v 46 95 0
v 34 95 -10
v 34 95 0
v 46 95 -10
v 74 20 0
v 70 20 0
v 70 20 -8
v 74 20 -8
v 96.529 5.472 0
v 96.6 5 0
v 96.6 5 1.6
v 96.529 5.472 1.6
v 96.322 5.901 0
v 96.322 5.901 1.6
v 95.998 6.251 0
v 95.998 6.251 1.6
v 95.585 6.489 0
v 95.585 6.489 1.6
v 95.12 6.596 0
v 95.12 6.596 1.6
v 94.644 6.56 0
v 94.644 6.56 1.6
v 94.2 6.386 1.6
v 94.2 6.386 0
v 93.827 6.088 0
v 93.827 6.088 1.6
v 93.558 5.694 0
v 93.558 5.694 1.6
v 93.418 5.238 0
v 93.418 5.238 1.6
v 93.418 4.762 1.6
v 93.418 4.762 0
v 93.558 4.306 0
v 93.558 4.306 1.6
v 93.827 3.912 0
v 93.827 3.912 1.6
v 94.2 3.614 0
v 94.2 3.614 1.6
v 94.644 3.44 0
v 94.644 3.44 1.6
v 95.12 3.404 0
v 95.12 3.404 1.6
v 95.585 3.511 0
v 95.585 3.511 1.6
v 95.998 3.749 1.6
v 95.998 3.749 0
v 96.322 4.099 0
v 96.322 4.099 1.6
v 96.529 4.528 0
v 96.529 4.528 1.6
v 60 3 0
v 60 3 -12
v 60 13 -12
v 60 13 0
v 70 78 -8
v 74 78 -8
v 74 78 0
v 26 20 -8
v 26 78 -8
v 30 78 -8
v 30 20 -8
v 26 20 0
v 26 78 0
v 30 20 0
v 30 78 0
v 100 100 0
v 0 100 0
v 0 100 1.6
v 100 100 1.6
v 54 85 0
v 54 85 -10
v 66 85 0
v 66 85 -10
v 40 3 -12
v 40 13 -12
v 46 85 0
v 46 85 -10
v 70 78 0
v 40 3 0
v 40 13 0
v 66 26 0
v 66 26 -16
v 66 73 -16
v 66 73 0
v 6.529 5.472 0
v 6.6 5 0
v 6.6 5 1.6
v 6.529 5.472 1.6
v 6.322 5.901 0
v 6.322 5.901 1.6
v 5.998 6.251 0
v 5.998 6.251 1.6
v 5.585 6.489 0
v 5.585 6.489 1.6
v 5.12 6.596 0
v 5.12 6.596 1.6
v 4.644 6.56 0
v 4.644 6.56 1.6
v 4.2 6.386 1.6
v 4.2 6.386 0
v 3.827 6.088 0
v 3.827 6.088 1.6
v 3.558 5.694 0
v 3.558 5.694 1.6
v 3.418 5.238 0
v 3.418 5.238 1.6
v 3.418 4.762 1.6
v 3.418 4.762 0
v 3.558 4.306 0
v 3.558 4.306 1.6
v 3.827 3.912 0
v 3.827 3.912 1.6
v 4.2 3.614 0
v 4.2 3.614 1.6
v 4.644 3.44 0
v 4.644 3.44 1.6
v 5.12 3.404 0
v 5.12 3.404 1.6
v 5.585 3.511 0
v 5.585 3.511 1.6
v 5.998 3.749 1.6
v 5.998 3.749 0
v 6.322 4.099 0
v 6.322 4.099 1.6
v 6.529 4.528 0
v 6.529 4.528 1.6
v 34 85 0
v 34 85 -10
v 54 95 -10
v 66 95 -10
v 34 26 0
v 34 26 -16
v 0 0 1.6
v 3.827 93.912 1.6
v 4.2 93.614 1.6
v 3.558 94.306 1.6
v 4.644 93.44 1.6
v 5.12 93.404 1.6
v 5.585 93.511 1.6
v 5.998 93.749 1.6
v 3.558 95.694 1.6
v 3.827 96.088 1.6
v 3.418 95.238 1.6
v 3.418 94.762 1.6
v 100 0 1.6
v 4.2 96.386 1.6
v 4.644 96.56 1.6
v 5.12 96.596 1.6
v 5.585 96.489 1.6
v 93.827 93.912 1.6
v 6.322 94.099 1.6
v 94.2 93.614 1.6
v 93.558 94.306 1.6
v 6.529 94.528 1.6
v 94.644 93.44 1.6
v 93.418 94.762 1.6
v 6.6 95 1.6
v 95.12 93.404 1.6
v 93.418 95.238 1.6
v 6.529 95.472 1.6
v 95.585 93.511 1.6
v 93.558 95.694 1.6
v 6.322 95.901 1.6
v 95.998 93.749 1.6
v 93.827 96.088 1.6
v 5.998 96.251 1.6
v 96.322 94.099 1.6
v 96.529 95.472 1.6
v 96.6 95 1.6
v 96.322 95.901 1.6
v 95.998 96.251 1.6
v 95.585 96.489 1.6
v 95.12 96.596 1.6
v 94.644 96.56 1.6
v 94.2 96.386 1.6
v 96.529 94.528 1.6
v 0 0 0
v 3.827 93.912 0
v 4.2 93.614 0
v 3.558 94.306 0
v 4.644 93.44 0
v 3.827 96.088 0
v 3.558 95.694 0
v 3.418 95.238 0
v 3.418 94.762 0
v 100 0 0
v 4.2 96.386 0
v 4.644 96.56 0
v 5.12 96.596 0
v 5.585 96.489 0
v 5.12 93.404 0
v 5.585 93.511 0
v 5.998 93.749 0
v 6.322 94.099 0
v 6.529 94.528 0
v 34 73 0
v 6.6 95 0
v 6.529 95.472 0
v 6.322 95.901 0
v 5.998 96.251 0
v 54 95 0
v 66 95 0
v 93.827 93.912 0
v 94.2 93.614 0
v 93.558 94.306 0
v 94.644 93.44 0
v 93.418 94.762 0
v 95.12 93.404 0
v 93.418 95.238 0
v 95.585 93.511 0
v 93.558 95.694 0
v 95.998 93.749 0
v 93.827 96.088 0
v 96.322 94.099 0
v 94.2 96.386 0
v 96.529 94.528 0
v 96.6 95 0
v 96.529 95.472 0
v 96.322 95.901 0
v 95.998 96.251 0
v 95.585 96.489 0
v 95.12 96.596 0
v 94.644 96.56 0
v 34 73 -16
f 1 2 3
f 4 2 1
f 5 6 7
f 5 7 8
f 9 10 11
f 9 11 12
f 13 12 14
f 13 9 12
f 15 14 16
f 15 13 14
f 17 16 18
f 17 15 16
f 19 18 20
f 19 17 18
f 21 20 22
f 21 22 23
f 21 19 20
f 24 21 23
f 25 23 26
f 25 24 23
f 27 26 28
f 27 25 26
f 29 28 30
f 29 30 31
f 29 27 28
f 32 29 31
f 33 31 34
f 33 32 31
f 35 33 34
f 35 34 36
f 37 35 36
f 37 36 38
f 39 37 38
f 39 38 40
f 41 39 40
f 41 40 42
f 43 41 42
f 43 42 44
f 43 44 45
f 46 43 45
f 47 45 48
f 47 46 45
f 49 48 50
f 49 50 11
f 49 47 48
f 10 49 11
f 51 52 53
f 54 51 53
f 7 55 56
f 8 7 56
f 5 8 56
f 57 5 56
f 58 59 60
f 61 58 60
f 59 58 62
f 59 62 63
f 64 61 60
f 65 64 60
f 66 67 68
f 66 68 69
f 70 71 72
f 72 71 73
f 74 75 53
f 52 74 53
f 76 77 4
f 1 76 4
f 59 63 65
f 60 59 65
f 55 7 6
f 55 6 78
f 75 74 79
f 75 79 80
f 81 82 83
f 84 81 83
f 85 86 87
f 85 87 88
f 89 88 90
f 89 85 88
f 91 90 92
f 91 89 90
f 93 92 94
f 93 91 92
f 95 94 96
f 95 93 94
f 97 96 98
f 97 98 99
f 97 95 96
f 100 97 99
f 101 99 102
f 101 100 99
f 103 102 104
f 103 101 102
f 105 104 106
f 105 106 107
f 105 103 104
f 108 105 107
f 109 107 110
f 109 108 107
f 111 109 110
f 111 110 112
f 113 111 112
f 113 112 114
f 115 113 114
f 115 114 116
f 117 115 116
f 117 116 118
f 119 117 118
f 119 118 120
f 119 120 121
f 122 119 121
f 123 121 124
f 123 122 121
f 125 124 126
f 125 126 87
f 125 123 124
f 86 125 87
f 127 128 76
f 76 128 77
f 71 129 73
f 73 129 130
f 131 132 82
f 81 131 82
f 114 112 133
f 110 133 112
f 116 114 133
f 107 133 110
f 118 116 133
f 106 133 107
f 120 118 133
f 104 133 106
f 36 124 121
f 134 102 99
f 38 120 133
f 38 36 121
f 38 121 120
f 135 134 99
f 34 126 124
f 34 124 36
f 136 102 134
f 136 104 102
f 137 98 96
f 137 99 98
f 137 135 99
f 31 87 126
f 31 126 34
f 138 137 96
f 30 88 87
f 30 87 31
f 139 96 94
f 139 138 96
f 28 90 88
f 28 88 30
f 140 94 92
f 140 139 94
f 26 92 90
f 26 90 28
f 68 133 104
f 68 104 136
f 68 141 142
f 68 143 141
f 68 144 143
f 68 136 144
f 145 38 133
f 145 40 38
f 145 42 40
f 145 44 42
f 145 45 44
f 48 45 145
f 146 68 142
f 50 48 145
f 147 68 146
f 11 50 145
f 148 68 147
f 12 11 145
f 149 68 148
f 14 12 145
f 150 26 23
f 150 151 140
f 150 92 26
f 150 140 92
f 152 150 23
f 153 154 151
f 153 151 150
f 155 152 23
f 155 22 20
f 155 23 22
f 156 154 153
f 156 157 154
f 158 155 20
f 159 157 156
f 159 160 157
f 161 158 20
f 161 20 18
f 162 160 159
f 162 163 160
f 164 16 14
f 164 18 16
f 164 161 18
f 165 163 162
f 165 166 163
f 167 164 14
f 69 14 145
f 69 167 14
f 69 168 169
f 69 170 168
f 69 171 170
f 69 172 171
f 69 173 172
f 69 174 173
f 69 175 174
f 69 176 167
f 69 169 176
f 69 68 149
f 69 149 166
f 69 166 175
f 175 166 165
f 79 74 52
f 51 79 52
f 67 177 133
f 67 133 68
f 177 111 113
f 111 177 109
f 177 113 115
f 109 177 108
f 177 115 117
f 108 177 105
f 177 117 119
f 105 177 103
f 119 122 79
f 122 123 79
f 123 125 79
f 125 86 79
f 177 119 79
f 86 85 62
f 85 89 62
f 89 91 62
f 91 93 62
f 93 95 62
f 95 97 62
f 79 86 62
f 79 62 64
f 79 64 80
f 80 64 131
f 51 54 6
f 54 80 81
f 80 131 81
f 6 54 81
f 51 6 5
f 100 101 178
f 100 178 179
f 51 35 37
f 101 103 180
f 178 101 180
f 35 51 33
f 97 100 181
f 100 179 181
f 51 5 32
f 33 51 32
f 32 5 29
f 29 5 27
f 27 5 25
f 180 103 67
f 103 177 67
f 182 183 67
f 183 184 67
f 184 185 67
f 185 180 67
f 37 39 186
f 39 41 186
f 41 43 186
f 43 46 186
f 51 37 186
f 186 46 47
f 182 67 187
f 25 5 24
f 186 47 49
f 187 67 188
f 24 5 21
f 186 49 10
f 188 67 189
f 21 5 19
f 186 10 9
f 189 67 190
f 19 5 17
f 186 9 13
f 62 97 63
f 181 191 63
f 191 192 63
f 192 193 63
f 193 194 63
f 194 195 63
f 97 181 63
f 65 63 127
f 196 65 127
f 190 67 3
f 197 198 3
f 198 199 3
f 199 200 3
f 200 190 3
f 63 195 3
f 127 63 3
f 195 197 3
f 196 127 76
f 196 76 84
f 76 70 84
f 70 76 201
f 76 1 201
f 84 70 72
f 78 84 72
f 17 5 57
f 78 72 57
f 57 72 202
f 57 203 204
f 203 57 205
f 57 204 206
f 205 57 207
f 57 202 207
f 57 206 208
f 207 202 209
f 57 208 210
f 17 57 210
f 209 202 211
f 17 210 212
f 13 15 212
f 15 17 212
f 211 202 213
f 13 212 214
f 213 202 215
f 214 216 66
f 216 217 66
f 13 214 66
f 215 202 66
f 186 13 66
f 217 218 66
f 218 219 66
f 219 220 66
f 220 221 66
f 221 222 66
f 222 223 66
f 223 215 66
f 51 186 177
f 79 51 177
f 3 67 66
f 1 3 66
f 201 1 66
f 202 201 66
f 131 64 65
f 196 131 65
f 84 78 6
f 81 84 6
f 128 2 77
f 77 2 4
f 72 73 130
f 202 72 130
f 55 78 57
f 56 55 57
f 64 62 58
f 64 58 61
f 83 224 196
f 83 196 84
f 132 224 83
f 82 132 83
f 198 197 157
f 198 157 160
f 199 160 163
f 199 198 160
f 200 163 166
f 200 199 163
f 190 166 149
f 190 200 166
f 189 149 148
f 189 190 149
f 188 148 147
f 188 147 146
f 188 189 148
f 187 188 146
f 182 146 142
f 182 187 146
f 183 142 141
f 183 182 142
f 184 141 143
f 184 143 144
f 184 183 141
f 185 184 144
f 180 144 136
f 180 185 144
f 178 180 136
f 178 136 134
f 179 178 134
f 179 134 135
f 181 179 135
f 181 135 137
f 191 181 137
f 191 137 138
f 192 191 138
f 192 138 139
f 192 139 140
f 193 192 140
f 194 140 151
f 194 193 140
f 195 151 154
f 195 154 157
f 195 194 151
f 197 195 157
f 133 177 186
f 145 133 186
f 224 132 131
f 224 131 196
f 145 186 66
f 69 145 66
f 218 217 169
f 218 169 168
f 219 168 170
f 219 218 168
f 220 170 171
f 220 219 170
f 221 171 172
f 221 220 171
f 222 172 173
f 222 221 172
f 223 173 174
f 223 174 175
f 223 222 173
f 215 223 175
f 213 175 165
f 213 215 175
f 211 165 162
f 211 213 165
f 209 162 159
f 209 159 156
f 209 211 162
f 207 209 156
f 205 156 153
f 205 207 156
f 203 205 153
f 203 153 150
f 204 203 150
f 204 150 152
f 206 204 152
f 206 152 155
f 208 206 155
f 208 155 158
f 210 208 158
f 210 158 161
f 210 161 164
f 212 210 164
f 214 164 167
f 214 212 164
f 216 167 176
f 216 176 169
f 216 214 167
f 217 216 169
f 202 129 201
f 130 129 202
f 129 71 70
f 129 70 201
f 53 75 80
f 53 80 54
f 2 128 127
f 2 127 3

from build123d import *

# Parameters (mm, degrees)
SKETCH_1_W          = 100
SKETCH_1_H          = 100
SKETCH_1_R          = 1.6
F_100X100_1P6_DEPTH = 1.6
EXTRUDE_START       = -8
SKETCH_2_W          = 4
SKETCH_2_H          = 58
EXTRUDE_284_DEPTH   = 8
SKETCH_3_W          = 4
SKETCH_3_H          = 58
EXTRUDE_361_DEPTH   = 8
EXTRUDE_START_2     = -16
SKETCH_4_W          = 32
SKETCH_4_H          = 47
EXTRUDE_435_DEPTH   = 16
EXTRUDE_START_3     = -12
SKETCH_5_W          = 20
SKETCH_5_H          = 10
EXTRUDE_509_DEPTH   = 12
EXTRUDE_START_4     = -10
SKETCH_6_W          = 12
SKETCH_6_H          = 10
EXTRUDE_583_DEPTH   = 10
SKETCH_7_W          = 12
SKETCH_7_H          = 10
EXTRUDE_657_DEPTH   = 10


with BuildPart() as part:
    # 草图1 → 100x100_板厚1p6 (new body)
    with BuildSketch(Plane.XY):
        with Locations((50, 50)):
            Rectangle(SKETCH_1_W, SKETCH_1_H)
        with Locations((5, 5)):
            Circle(SKETCH_1_R, mode=Mode.SUBTRACT)
        with Locations((95, 5)):
            Circle(SKETCH_1_R, mode=Mode.SUBTRACT)
        with Locations((5, 95)):
            Circle(SKETCH_1_R, mode=Mode.SUBTRACT)
        with Locations((95, 95)):
            Circle(SKETCH_1_R, mode=Mode.SUBTRACT)
    extrude(amount=F_100X100_1P6_DEPTH)

    # 草图2 → Extrude 284 (add)
    with BuildSketch(Plane.XY.offset(EXTRUDE_START)):
        with Locations((28, 49)):
            Rectangle(SKETCH_2_W, SKETCH_2_H)
    extrude(amount=EXTRUDE_284_DEPTH)

    # 草图3 → Extrude 361 (add)
    with BuildSketch(Plane.XY.offset(EXTRUDE_START)):
        with Locations((72, 49)):
            Rectangle(SKETCH_3_W, SKETCH_3_H)
    extrude(amount=EXTRUDE_361_DEPTH)

    # 草图4 → Extrude 435 (add)
    with BuildSketch(Plane.XY.offset(EXTRUDE_START_2)):
        with Locations((50, 49.5)):
            Rectangle(SKETCH_4_W, SKETCH_4_H)
    extrude(amount=EXTRUDE_435_DEPTH)

    # 草图5 → Extrude 509 (add)
    with BuildSketch(Plane.XY.offset(EXTRUDE_START_3)):
        with Locations((50, 8)):
            Rectangle(SKETCH_5_W, SKETCH_5_H)
    extrude(amount=EXTRUDE_509_DEPTH)

    # 草图6 → Extrude 583 (add)
    with BuildSketch(Plane.XY.offset(EXTRUDE_START_4)):
        with Locations((40, 90)):
            Rectangle(SKETCH_6_W, SKETCH_6_H)
    extrude(amount=EXTRUDE_583_DEPTH)

    # 草图7 → Extrude 657 (add)
    with BuildSketch(Plane.XY.offset(EXTRUDE_START_4)):
        with Locations((60, 90)):
            Rectangle(SKETCH_7_W, SKETCH_7_H)
    extrude(amount=EXTRUDE_657_DEPTH)


solid = part.part
